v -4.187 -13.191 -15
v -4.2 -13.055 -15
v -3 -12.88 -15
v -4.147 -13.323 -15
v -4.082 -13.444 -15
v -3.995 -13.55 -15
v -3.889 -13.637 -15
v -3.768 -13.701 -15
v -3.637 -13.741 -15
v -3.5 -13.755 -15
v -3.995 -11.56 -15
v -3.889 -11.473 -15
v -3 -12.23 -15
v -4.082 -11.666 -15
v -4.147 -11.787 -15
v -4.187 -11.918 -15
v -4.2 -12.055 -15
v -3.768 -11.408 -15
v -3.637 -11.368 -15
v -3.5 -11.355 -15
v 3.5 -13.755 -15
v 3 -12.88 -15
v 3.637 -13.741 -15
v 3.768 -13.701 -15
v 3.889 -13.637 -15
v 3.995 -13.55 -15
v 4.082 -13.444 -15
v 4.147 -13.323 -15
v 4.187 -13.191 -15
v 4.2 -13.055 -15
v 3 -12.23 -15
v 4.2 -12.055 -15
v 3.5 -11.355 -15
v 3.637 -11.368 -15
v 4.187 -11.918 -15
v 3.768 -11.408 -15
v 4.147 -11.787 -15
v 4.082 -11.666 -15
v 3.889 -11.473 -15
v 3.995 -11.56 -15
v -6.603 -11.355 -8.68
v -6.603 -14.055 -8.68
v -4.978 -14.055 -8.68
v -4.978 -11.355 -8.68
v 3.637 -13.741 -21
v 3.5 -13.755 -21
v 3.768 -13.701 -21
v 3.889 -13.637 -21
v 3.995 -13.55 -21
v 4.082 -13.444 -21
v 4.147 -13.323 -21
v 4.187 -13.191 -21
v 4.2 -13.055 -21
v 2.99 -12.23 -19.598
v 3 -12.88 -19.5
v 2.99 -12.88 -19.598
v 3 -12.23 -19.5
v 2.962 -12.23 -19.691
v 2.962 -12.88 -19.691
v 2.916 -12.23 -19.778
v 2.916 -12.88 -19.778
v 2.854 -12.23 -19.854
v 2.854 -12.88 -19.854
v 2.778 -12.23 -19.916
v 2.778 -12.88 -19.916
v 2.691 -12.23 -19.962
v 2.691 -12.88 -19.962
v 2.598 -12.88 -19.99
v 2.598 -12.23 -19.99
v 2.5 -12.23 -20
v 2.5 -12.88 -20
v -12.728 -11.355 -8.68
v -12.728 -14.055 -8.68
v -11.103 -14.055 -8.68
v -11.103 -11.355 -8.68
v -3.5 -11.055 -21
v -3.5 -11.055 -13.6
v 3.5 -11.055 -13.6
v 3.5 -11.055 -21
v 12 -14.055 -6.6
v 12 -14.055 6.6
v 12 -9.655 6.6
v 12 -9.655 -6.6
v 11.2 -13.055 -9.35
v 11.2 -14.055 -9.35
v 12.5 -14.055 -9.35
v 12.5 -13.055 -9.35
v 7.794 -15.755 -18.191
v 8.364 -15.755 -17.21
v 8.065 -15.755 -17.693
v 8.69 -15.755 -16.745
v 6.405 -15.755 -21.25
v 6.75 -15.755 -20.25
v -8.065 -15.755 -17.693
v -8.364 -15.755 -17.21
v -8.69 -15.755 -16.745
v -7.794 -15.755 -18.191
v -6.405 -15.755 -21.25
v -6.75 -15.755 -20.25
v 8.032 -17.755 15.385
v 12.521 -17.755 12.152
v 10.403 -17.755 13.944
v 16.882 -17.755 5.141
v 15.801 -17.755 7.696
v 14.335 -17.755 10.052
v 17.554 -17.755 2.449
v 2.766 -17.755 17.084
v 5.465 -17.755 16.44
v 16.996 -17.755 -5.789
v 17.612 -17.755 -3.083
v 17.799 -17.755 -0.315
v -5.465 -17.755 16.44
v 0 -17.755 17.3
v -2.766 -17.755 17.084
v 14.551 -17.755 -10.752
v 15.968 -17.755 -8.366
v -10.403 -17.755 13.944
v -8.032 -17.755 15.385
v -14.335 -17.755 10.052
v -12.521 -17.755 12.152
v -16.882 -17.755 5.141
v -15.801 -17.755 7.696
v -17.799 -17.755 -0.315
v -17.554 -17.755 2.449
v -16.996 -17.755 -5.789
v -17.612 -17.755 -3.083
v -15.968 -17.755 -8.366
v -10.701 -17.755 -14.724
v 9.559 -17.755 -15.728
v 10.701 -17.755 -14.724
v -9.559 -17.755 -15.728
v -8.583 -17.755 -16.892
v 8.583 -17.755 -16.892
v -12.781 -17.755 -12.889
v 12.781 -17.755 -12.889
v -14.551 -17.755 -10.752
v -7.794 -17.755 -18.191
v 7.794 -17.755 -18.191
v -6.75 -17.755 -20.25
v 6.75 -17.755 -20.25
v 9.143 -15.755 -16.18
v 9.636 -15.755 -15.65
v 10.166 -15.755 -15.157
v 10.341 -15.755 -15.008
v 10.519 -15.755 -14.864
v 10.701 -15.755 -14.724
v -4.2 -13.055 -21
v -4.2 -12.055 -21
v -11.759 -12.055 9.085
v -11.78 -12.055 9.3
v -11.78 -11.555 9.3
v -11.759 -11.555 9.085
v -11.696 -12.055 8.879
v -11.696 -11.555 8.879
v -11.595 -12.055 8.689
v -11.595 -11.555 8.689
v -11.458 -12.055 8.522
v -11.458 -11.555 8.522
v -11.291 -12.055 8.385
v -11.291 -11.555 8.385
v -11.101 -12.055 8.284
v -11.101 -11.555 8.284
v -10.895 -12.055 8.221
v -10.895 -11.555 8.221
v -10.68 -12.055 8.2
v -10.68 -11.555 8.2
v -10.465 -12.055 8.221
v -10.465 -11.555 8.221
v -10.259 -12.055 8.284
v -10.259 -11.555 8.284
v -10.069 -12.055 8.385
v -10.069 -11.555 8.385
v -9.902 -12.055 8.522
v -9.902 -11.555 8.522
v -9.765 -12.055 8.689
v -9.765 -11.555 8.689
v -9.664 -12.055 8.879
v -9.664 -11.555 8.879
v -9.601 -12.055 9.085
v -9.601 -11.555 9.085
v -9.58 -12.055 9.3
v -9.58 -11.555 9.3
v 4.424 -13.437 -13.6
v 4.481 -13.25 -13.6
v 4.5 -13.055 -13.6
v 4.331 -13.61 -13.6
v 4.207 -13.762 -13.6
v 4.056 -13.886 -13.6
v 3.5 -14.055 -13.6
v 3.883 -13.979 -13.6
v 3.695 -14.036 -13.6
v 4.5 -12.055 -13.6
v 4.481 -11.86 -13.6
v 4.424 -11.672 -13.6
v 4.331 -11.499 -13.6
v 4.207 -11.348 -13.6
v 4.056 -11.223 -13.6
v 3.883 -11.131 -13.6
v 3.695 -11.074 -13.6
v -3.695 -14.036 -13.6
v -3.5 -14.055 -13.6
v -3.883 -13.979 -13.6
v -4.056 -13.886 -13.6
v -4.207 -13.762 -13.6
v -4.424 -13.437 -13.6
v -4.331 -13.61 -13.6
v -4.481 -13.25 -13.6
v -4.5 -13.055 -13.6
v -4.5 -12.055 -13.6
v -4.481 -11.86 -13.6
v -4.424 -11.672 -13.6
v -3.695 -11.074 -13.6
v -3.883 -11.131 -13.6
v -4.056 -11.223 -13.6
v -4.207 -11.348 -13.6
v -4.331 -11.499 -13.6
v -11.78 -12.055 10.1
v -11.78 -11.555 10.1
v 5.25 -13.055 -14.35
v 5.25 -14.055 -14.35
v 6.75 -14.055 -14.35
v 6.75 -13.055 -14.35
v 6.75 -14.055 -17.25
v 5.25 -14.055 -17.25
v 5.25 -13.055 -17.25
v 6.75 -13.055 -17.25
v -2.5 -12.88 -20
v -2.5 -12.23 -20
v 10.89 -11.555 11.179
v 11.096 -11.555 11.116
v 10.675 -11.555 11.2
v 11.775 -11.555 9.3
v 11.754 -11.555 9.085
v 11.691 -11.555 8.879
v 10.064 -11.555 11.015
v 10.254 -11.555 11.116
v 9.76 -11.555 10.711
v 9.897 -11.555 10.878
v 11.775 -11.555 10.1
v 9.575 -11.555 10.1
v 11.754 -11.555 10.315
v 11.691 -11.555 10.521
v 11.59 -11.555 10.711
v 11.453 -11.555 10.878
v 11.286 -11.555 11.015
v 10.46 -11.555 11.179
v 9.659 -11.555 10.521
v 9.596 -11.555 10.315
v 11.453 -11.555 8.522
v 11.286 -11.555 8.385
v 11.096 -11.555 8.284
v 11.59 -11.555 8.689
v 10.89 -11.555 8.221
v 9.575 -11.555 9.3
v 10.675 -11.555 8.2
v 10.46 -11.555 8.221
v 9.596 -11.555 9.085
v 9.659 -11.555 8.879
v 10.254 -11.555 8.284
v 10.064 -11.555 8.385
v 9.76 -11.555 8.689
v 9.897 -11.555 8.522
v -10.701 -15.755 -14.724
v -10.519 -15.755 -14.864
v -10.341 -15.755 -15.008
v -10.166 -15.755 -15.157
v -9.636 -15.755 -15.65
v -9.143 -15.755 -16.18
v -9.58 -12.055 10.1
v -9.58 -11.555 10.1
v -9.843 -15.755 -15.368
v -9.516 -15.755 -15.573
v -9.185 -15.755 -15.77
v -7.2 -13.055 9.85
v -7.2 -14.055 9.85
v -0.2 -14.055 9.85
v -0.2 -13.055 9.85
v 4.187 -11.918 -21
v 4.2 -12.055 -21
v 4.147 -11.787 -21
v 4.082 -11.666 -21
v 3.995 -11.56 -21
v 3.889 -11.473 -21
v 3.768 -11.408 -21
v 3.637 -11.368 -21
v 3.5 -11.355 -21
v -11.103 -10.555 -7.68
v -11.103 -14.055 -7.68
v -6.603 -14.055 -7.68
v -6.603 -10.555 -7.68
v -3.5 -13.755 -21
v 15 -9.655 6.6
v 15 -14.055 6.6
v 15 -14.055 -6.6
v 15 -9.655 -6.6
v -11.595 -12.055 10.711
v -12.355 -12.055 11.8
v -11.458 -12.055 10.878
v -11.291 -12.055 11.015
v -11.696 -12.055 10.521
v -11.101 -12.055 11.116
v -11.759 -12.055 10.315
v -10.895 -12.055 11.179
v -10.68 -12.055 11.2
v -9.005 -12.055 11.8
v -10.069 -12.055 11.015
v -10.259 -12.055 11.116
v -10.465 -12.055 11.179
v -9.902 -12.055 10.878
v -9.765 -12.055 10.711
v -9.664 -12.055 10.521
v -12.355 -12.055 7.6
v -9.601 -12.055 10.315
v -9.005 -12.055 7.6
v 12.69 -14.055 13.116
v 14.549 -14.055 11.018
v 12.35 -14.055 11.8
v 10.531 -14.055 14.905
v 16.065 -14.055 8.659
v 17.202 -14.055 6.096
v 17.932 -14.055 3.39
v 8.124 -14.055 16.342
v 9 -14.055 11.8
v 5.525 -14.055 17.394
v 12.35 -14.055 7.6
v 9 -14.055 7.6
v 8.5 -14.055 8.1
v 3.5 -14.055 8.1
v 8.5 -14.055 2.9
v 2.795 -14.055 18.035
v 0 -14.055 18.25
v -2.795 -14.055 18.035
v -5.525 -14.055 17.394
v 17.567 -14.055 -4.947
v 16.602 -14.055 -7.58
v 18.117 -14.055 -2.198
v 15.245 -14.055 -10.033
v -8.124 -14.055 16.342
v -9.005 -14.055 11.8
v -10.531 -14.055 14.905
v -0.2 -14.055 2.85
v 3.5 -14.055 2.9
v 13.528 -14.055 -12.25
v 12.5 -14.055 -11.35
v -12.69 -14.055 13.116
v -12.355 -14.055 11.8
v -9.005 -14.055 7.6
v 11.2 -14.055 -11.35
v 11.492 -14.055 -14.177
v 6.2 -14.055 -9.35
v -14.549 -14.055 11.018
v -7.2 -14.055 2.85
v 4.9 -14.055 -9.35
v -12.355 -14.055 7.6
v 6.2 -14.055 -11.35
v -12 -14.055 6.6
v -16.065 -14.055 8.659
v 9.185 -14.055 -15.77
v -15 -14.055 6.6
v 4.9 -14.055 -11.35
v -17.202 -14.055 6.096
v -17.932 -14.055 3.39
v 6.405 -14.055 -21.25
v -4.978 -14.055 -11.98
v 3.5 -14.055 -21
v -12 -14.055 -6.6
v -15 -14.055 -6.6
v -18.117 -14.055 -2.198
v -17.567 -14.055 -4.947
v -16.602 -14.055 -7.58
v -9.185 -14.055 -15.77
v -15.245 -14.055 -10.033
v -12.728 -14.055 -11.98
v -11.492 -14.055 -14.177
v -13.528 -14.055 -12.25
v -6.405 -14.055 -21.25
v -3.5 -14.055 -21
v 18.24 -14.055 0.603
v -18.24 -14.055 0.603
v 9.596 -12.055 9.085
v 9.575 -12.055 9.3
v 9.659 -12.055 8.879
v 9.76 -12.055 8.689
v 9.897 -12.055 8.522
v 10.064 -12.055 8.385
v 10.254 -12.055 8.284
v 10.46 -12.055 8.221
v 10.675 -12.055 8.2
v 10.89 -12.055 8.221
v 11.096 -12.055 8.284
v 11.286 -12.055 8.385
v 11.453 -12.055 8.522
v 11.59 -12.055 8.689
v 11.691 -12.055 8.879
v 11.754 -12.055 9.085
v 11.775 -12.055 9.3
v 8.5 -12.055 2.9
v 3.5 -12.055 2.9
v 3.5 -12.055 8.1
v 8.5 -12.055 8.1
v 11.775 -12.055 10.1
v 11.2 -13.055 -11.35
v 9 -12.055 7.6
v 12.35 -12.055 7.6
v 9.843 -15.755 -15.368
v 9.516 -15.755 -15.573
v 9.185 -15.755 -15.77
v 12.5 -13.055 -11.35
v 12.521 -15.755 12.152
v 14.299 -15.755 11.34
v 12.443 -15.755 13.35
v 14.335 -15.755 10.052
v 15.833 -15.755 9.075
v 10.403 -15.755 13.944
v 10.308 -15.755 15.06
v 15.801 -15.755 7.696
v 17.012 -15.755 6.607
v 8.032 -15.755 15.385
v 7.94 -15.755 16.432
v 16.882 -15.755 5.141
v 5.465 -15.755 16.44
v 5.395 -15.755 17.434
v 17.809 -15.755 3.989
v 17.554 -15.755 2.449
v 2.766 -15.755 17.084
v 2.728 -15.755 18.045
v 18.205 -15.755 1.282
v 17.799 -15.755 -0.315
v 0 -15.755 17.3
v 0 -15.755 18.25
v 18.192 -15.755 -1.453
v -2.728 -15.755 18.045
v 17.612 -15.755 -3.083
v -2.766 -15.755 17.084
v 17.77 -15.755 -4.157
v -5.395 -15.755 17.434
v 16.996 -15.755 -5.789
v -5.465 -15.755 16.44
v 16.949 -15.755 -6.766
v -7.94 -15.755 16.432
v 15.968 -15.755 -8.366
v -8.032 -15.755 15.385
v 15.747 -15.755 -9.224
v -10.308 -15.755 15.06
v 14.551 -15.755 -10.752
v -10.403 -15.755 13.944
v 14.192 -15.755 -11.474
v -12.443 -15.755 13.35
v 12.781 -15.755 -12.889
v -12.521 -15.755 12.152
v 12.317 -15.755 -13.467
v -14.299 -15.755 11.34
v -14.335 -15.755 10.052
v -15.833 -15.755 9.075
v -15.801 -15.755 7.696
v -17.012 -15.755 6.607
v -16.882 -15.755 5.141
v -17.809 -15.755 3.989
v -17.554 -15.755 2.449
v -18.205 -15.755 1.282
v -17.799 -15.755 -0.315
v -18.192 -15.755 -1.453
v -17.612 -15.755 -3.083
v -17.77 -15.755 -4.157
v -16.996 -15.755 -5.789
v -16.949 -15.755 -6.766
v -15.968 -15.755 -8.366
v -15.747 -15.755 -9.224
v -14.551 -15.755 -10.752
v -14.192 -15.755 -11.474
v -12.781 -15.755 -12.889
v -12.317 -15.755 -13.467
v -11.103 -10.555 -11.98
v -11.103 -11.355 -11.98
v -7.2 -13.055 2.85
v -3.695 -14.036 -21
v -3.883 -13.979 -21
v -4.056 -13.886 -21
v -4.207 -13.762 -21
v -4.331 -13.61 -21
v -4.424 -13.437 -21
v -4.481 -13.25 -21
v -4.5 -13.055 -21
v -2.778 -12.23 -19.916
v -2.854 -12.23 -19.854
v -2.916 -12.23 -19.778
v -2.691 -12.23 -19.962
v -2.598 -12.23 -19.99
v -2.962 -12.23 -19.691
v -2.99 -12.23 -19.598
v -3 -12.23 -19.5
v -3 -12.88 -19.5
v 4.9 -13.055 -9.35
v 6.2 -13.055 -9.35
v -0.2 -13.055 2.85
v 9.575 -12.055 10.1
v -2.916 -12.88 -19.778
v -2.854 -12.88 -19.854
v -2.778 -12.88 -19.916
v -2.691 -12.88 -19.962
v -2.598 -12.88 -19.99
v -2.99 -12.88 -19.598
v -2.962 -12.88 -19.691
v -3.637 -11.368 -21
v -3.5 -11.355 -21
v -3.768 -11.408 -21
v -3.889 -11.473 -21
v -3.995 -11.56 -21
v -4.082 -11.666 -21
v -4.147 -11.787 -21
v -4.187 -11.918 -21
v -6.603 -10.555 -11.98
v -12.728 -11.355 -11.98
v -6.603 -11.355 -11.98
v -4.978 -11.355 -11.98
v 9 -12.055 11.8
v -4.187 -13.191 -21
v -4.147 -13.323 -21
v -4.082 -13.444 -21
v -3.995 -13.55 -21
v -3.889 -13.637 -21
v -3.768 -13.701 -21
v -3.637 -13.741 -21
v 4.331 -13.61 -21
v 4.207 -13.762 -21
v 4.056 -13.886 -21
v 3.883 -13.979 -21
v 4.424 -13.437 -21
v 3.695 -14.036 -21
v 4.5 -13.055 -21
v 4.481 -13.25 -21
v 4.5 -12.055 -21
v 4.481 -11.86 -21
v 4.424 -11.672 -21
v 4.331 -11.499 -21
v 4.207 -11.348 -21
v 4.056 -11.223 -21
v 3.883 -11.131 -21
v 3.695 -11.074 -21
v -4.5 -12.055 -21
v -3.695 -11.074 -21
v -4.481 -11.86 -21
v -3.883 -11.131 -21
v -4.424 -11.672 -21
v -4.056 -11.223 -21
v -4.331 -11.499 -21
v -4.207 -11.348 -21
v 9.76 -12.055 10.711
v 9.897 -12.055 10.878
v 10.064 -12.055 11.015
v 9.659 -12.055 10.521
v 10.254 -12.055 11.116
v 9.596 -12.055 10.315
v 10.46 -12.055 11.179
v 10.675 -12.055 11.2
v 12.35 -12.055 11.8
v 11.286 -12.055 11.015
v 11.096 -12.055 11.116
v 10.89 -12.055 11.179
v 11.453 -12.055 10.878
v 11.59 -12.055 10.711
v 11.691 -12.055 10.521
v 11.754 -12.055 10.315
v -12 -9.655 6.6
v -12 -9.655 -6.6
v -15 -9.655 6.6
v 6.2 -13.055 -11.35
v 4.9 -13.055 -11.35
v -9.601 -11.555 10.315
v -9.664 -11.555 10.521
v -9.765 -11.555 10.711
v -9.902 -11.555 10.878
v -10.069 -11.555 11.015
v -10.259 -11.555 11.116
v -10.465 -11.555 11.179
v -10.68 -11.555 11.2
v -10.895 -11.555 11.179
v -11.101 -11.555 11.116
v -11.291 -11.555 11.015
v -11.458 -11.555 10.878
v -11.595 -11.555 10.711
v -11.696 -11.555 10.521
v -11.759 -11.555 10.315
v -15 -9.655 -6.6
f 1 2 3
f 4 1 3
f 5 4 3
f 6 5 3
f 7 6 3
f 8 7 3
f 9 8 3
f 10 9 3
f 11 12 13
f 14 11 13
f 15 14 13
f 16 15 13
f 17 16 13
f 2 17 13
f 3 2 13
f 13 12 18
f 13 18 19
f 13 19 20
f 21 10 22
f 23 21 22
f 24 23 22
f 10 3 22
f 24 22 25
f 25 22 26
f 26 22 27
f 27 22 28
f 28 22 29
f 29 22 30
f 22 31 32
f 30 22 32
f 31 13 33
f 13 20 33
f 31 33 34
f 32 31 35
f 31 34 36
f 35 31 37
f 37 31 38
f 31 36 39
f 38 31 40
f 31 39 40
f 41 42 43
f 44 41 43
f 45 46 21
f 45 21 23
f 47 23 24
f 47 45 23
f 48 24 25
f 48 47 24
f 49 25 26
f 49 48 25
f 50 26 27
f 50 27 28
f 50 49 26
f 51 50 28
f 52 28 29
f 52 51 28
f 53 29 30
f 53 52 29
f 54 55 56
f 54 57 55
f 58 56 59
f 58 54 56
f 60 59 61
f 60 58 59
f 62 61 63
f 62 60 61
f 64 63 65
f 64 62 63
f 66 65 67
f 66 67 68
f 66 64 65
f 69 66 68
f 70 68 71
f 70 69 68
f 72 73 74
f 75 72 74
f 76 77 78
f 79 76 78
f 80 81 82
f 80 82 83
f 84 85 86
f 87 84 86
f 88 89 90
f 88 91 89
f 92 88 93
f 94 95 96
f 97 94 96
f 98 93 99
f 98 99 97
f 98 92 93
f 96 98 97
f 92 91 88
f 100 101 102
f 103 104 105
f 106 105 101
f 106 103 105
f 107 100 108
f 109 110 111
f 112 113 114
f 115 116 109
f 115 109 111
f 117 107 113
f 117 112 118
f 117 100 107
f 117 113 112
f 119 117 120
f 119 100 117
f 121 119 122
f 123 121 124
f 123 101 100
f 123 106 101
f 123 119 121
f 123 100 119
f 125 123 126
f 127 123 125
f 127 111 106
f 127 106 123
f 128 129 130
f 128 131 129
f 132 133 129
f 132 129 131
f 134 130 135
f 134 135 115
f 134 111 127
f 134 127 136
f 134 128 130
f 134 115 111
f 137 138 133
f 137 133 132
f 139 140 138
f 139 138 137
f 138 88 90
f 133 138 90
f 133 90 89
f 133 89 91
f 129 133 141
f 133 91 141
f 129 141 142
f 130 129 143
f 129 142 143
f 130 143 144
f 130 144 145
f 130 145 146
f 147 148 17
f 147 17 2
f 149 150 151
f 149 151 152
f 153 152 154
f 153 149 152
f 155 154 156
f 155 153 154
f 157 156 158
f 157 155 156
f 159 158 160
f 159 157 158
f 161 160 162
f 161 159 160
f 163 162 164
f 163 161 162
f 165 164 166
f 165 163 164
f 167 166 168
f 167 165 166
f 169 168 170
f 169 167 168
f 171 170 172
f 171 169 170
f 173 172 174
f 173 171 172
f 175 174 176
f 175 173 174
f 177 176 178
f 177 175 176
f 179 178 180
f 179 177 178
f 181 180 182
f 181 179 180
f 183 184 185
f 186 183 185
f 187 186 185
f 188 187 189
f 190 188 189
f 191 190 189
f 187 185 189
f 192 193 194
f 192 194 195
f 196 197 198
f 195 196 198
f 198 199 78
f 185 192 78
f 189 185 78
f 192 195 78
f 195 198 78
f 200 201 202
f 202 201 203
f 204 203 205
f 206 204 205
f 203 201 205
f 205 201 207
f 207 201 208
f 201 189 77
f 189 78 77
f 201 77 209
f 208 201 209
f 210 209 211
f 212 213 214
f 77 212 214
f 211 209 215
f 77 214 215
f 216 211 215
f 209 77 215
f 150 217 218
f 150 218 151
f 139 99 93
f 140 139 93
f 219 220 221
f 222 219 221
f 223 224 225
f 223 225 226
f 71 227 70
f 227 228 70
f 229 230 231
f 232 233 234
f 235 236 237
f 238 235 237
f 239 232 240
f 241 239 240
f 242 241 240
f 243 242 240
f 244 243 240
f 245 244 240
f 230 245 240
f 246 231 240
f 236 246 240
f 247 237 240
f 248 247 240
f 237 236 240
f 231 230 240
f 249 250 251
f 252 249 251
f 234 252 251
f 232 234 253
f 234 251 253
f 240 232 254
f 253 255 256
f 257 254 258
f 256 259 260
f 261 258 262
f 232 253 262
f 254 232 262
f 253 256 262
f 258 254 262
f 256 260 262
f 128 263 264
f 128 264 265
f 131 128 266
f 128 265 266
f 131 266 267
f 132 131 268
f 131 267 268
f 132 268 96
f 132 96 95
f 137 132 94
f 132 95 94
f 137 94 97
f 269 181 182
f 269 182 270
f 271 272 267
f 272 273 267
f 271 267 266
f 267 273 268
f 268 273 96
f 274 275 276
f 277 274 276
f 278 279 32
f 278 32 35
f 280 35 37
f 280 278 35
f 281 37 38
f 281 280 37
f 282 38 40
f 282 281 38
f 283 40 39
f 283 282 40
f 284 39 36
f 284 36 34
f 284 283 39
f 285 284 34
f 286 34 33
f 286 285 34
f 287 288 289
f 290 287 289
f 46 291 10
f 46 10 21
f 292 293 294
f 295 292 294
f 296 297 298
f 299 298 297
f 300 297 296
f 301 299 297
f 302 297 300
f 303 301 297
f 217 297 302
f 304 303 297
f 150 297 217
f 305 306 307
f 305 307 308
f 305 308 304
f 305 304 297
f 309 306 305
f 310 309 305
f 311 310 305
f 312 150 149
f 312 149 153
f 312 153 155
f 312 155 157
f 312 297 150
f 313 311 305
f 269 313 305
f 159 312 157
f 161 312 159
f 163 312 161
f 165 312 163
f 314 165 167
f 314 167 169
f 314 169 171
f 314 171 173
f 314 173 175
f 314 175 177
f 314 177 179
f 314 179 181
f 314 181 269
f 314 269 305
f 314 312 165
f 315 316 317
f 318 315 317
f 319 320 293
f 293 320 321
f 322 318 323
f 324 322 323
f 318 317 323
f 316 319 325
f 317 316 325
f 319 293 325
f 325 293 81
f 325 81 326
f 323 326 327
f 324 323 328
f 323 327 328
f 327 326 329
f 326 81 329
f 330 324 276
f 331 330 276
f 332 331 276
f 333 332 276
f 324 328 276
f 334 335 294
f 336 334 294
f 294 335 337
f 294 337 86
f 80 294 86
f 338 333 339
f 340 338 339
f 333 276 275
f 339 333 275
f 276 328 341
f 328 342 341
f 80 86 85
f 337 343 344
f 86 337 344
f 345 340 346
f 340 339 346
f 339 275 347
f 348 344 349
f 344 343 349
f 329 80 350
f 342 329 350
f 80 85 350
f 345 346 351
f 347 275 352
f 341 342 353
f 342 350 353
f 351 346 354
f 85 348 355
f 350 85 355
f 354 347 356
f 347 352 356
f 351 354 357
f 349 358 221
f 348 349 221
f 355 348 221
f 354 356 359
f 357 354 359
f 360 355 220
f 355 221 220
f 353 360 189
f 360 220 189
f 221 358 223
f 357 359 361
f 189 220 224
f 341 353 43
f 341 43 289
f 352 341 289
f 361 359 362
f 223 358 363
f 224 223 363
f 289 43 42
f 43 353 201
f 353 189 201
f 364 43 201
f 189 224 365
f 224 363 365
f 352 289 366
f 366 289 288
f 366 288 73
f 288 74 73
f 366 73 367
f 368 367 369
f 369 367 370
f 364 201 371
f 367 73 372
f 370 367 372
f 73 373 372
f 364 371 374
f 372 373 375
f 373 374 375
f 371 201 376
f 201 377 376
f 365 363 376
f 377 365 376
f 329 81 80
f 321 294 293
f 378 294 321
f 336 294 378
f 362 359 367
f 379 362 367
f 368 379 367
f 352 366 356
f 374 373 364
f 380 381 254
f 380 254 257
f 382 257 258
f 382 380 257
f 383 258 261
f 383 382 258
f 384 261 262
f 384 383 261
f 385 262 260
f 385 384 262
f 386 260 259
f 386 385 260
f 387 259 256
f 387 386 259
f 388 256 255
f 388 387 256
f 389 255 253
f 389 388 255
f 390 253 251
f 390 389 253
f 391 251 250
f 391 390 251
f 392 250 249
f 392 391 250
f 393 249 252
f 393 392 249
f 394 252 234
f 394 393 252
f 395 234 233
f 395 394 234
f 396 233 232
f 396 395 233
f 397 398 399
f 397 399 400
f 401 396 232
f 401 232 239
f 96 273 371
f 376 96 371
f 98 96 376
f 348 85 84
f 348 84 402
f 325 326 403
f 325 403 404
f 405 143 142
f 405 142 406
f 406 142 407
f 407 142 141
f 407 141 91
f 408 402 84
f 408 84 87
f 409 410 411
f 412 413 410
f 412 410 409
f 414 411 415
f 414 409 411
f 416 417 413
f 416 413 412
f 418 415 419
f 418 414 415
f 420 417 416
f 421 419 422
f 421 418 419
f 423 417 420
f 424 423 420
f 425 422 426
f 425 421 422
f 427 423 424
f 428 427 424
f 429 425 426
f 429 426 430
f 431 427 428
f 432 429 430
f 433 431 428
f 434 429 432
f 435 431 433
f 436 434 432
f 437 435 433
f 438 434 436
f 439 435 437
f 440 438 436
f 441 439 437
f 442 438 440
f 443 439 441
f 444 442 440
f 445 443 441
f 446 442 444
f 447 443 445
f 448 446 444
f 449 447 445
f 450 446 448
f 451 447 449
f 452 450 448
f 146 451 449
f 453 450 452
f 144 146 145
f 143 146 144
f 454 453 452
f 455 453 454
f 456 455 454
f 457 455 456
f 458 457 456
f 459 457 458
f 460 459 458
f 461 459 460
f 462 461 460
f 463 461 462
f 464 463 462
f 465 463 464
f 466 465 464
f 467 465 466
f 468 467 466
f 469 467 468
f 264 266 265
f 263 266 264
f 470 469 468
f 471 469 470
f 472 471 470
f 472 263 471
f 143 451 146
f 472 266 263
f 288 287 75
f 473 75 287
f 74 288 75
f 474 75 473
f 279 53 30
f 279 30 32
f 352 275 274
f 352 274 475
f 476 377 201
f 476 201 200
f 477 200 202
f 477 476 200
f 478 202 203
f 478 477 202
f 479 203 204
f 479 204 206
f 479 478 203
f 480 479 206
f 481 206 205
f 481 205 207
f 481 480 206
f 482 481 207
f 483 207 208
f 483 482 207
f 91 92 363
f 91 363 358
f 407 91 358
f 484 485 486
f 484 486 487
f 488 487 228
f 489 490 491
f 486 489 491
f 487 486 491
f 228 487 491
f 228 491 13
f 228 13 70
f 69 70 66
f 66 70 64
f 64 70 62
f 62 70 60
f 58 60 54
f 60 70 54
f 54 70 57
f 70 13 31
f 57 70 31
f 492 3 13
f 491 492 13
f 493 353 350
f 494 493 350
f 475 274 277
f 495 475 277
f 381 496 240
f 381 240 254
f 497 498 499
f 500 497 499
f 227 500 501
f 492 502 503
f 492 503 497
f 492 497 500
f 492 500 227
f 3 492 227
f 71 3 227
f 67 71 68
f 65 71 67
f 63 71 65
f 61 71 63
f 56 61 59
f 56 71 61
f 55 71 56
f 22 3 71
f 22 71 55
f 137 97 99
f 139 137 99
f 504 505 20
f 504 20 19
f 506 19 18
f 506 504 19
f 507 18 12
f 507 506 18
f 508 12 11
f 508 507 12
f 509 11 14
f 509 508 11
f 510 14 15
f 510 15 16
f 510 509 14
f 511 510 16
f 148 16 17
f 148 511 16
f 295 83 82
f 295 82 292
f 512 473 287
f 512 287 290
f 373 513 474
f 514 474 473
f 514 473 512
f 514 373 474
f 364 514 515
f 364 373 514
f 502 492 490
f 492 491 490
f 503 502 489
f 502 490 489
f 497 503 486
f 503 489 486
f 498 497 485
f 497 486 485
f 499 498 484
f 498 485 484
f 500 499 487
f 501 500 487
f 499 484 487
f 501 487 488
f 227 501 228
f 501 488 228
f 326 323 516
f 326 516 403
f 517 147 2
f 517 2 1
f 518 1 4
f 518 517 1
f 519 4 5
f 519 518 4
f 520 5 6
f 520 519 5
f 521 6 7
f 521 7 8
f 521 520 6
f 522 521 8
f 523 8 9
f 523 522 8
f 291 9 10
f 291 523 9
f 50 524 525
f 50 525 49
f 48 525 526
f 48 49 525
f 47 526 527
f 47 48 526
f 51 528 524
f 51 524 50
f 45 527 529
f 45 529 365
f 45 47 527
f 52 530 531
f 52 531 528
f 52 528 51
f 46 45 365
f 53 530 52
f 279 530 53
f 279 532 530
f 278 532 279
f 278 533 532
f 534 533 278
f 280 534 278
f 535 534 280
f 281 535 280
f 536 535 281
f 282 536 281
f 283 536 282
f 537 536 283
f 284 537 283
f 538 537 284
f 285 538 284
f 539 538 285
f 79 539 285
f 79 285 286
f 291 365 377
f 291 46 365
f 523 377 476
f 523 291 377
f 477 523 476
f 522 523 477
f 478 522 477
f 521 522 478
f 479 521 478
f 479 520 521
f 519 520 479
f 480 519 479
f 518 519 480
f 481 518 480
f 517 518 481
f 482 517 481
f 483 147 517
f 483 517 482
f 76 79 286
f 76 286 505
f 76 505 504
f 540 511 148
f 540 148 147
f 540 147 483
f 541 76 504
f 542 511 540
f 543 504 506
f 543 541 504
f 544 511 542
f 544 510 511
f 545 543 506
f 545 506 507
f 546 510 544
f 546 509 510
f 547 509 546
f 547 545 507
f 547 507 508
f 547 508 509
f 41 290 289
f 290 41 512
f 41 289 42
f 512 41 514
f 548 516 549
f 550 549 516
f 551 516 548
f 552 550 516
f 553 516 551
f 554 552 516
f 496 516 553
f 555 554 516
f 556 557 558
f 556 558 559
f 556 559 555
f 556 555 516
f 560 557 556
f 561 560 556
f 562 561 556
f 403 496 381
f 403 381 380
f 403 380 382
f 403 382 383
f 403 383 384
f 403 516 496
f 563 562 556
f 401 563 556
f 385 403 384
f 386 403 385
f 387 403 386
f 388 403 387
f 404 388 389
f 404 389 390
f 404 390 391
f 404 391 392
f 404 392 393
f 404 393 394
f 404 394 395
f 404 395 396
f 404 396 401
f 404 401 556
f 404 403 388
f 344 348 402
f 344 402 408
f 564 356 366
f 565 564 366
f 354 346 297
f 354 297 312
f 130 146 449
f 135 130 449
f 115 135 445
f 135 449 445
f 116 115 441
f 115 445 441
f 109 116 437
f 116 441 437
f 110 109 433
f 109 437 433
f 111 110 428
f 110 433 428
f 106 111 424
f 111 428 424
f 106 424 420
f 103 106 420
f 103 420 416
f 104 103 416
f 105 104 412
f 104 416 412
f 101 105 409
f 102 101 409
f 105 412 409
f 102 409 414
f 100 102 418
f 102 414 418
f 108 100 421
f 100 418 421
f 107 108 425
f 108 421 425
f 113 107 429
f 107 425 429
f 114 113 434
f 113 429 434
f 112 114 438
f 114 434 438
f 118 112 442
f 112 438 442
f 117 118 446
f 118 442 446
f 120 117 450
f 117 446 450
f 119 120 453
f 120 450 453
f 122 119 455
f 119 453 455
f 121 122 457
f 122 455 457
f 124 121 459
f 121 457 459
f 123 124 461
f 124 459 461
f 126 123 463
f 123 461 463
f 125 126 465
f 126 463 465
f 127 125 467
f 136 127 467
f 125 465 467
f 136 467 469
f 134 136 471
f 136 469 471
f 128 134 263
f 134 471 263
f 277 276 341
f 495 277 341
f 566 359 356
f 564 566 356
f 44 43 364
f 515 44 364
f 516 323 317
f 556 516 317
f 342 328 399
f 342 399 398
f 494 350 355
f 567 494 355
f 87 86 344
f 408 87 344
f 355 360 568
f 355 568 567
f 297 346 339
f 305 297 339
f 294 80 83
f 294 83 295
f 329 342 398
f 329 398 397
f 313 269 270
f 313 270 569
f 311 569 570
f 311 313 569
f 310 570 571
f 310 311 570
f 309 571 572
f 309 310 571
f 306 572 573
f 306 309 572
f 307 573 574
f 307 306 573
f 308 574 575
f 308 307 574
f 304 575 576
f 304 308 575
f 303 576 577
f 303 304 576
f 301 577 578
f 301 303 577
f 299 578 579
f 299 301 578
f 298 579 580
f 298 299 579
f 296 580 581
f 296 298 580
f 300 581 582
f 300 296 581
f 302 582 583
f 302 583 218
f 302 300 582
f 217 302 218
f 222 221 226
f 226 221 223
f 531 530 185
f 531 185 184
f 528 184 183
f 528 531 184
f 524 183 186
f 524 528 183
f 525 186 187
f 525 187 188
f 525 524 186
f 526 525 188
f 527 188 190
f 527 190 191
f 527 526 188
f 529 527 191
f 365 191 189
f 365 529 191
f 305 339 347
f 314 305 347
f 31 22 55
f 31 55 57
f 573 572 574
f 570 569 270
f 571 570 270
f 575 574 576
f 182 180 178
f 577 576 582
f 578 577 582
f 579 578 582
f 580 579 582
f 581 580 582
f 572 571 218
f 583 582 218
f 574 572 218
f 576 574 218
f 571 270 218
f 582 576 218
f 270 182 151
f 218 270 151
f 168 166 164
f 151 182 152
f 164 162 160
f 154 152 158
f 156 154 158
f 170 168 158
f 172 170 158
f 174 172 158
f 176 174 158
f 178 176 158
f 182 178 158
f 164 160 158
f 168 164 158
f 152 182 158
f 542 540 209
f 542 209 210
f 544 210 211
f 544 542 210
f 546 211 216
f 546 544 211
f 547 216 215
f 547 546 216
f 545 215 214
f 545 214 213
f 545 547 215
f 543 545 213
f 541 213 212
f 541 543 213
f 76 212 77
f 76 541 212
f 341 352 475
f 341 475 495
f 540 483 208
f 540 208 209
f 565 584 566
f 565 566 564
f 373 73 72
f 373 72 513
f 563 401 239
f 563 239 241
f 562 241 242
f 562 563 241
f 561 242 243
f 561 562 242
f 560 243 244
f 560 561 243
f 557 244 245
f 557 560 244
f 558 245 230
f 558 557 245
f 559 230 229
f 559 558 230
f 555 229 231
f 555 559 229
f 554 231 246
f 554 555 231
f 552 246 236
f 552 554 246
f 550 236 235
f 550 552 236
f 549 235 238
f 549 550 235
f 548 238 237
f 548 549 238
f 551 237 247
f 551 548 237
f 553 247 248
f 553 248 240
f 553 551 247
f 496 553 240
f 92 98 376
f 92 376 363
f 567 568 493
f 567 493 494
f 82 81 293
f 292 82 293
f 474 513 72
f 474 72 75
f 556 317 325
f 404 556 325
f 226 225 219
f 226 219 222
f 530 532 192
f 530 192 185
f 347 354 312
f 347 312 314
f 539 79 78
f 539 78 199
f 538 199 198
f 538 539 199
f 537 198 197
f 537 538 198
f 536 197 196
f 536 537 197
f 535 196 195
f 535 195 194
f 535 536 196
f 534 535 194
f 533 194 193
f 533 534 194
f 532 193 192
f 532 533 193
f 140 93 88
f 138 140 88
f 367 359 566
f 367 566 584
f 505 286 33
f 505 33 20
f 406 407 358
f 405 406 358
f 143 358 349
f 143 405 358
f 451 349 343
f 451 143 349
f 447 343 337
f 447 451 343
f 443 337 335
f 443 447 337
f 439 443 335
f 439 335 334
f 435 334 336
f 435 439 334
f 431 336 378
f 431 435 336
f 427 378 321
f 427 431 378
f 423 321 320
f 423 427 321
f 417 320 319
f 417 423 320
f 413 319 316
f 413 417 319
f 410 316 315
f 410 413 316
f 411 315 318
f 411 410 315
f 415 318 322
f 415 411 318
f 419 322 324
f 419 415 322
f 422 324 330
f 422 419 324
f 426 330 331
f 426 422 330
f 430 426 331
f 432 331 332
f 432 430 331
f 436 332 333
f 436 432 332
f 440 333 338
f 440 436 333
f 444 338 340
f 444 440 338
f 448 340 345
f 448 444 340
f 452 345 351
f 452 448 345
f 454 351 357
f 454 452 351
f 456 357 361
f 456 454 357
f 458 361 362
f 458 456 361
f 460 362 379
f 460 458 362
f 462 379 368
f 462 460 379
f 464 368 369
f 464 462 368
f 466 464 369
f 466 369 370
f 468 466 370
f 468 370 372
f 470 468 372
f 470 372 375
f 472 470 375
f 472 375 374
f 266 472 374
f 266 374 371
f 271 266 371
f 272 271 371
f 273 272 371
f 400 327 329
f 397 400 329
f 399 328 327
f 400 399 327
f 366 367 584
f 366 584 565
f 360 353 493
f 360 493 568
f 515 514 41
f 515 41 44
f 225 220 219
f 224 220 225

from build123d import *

# Parameters (mm, degrees)
BOSS_EXTRUDE1_DEPTH  = 1.7
BOSS_EXTRUDE2_DEPTH  = 2
BOSS_EXTRUDE3_START  = 1.7
SKETCH3_W            = 3
SKETCH3_H            = 13.2
BOSS_EXTRUDE3_DEPTH  = 4.4
BOSS_EXTRUDE4_START  = -21
BOSS_EXTRUDE4_DEPTH  = 7.4
CUT_EXTRUDE1_START   = -21
CUT_EXTRUDE1_DEPTH   = 6
BOSS_EXTRUDE5_START  = -15
SKETCH8_W            = 6
SKETCH8_H            = 0.65
BOSS_EXTRUDE5_DEPTH  = 5
FILLET1_R            = 0.5
BOSS_EXTRUDE6_START  = 1.7
SKETCH9_W            = 5
SKETCH9_H            = 5.2
BOSS_EXTRUDE6_DEPTH  = 2
BOSS_EXTRUDE7_START  = 1.7
SKETCH10_W           = 3.35
SKETCH10_H           = 4.2
BOSS_EXTRUDE7_DEPTH  = 2
BOSS_EXTRUDE8_START  = 3.7
BOSS_EXTRUDE8_DEPTH  = 0.5
BOSS_EXTRUDE9_START  = 1.7
SKETCH12_W           = 4.5
SKETCH12_H           = 4.3
BOSS_EXTRUDE9_DEPTH  = 3.5
BOSS_EXTRUDE10_START = 1.7
SKETCH13_W           = 7.75
SKETCH13_H           = 3.3
BOSS_EXTRUDE10_DEPTH = 2.7
BOSS_EXTRUDE11_START = 1.7
SKETCH14_W           = 7
SKETCH14_H           = 7
BOSS_EXTRUDE11_DEPTH = 1
BOSS_EXTRUDE12_START = 1.7
SKETCH15_W           = 1.3
SKETCH15_H           = 2
BOSS_EXTRUDE12_DEPTH = 1
BOSS_EXTRUDE13_START = 1.7
SKETCH16_W           = 1.5
SKETCH16_H           = 2.9
BOSS_EXTRUDE13_DEPTH = 1


with BuildPart() as part:
    # Sketch1 → Boss-Extrude1 (new body)
    with BuildSketch(Plane(origin=(0, 0, 0), x_dir=(1, 0, 0), z_dir=(0, 1, 0))):
        with BuildLine():
            Line((-6.405, 21.250170418), (6.405, 21.250170418))
            Line((6.405, 21.250170418), (9.185, 15.770170418))
            ThreePointArc((9.185, 15.770170418), (0, -18.25), (-9.185, 15.770170418))
            Line((-9.185, 15.770170418), (-6.405, 21.250170418))
        make_face()
    extrude(amount=BOSS_EXTRUDE1_DEPTH)

    # Sketch2 → Boss-Extrude2 (add)
    with BuildSketch(Plane(origin=(0, 0, 0), x_dir=(1, 0, 0), z_dir=(0, 1, 0))):
        with BuildLine():
            Line((-6.75, 20.250170418), (6.75, 20.250170418))
            Line((6.75, 20.250170418), (7.794367451, 18.191489254))
            ThreePointArc((7.794367451, 18.191489254), (9.048926778, 16.291420125), (10.700777057, 14.724393497))
            ThreePointArc((10.700777057, 14.724393497), (0, -17.3), (-10.700777057, 14.724393497))
            ThreePointArc((-10.700777057, 14.724393497), (-9.048926778, 16.291420125), (-7.794367451, 18.191489254))
            Line((-7.794367451, 18.191489254), (-6.75, 20.250170418))
        make_face()
    extrude(amount=-BOSS_EXTRUDE2_DEPTH)

    # Sketch3 → Boss-Extrude3 (add)
    with BuildSketch(Plane(origin=(0, 0, 0), x_dir=(1, 0, 0), z_dir=(0, 1, 0)).offset(BOSS_EXTRUDE3_START)):
        with Locations((-13.5, 0)):
            Rectangle(SKETCH3_W, SKETCH3_H)
        with Locations((13.5, 0)):
            Rectangle(SKETCH3_W, SKETCH3_H)
    extrude(amount=BOSS_EXTRUDE3_DEPTH)

    # Sketch4 → Boss-Extrude4 (add)
    with BuildSketch(Plane.XY.offset(BOSS_EXTRUDE4_START)):
        with BuildLine():
            Line((3.5, 1.7), (-3.5, 1.7))
            ThreePointArc((-3.5, 1.7), (-4.207106781, 1.992893219), (-4.5, 2.7))
            Line((-4.5, 2.7), (-4.5, 3.7))
            ThreePointArc((-4.5, 3.7), (-4.207106781, 4.407106781), (-3.5, 4.7))
            Line((-3.5, 4.7), (3.5, 4.7))
            ThreePointArc((3.5, 4.7), (4.207106781, 4.407106781), (4.5, 3.7))
            Line((4.5, 3.7), (4.5, 2.7))
            ThreePointArc((4.5, 2.7), (4.207106781, 1.992893219), (3.5, 1.7))
        make_face()
    extrude(amount=BOSS_EXTRUDE4_DEPTH)

    # Sketch7 → Cut-Extrude1 (cut)
    with BuildSketch(Plane.XY.offset(CUT_EXTRUDE1_START)):
        with BuildLine():
            Line((4.2, 2.7), (4.2, 3.7))
            ThreePointArc((4.2, 3.7), (3.994974747, 4.194974747), (3.5, 4.4))
            Line((3.5, 4.4), (-3.5, 4.4))
            ThreePointArc((-3.5, 4.4), (-3.994974747, 4.194974747), (-4.2, 3.7))
            Line((-4.2, 3.7), (-4.2, 2.7))
            ThreePointArc((-4.2, 2.7), (-3.994974747, 2.205025253), (-3.5, 2))
            Line((-3.5, 2), (3.5, 2))
            ThreePointArc((3.5, 2), (3.994974747, 2.205025253), (4.2, 2.7))
        make_face()
    extrude(amount=CUT_EXTRUDE1_DEPTH, mode=Mode.SUBTRACT)

    # Sketch8 → Boss-Extrude5 (add)
    with BuildSketch(Plane.XY.offset(BOSS_EXTRUDE5_START)):
        with Locations((0, 3.2)):
            Rectangle(SKETCH8_W, SKETCH8_H)
    extrude(amount=-BOSS_EXTRUDE5_DEPTH)

    # Fillet1
    fillet1_edges = [part.edges().sort_by_distance(p)[0] for p in [
        (-3, 3.2, -20),
        (3, 3.2, -20),
    ]]
    fillet(fillet1_edges, radius=FILLET1_R)

    # Sketch9 → Boss-Extrude6 (add)
    with BuildSketch(Plane(origin=(0, 0, 0), x_dir=(1, 0, 0), z_dir=(0, 1, 0)).offset(BOSS_EXTRUDE6_START)):
        with Locations((6, -5.5)):
            Rectangle(SKETCH9_W, SKETCH9_H)
    extrude(amount=BOSS_EXTRUDE6_DEPTH)

    # Sketch10 → Boss-Extrude7 (add)
    with BuildSketch(Plane(origin=(0, 0, 0), x_dir=(1, 0, 0), z_dir=(0, 1, 0)).offset(BOSS_EXTRUDE7_START)):
        with Locations((10.675, -9.7)):
            Rectangle(SKETCH10_W, SKETCH10_H)
        with Locations((-10.68, -9.7)):
            Rectangle(SKETCH10_W, SKETCH10_H)
    extrude(amount=BOSS_EXTRUDE7_DEPTH)

    # Sketch11 → Boss-Extrude8 (add)
    with BuildSketch(Plane(origin=(0, 0, 0), x_dir=(1, 0, 0), z_dir=(0, 1, 0)).offset(BOSS_EXTRUDE8_START)):
        with BuildLine():
            Line((-11.78, -10.1), (-11.78, -9.3))
            ThreePointArc((-11.78, -9.3), (-10.68, -8.2), (-9.58, -9.3))
            Line((-9.58, -9.3), (-9.58, -10.1))
            ThreePointArc((-9.58, -10.1), (-10.68, -11.2), (-11.78, -10.1))
        make_face()
        with BuildLine():
            Line((9.575, -10.1), (9.575, -9.3))
            ThreePointArc((9.575, -9.3), (10.675, -8.2), (11.775, -9.3))
            Line((11.775, -9.3), (11.775, -10.1))
            ThreePointArc((11.775, -10.1), (10.675, -11.2), (9.575, -10.1))
        make_face()
    extrude(amount=BOSS_EXTRUDE8_DEPTH)

    # Sketch12 → Boss-Extrude9 (add)
    with BuildSketch(Plane(origin=(0, 0, 0), x_dir=(1, 0, 0), z_dir=(0, 1, 0)).offset(BOSS_EXTRUDE9_START)):
        with Locations((-8.852751595, 9.830469474)):
            Rectangle(SKETCH12_W, SKETCH12_H)
    extrude(amount=BOSS_EXTRUDE9_DEPTH)

    # Sketch13 → Boss-Extrude10 (add)
    with BuildSketch(Plane(origin=(0, 0, 0), x_dir=(1, 0, 0), z_dir=(0, 1, 0)).offset(BOSS_EXTRUDE10_START)):
        with Locations((-8.852751595, 10.330469474)):
            Rectangle(SKETCH13_W, SKETCH13_H)
    extrude(amount=BOSS_EXTRUDE10_DEPTH)

    # Sketch14 → Boss-Extrude11 (add)
    with BuildSketch(Plane(origin=(0, 0, 0), x_dir=(1, 0, 0), z_dir=(0, 1, 0)).offset(BOSS_EXTRUDE11_START)):
        with Locations((-3.7, -6.35)):
            Rectangle(SKETCH14_W, SKETCH14_H)
    extrude(amount=BOSS_EXTRUDE11_DEPTH)

    # Sketch15 → Boss-Extrude12 (add)
    with BuildSketch(Plane(origin=(0, 0, 0), x_dir=(1, 0, 0), z_dir=(0, 1, 0)).offset(BOSS_EXTRUDE12_START)):
        with Locations((11.85, 10.35)):
            Rectangle(SKETCH15_W, SKETCH15_H)
        with Locations((5.55, 10.35)):
            Rectangle(SKETCH15_W, SKETCH15_H)
    extrude(amount=BOSS_EXTRUDE12_DEPTH)

    # Sketch16 → Boss-Extrude13 (add)
    with BuildSketch(Plane(origin=(0, 0, 0), x_dir=(1, 0, 0), z_dir=(0, 1, 0)).offset(BOSS_EXTRUDE13_START)):
        with Locations((6, 15.8)):
            Rectangle(SKETCH16_W, SKETCH16_H)
    extrude(amount=BOSS_EXTRUDE13_DEPTH)


with BuildPart() as part_1:
    # Body-Move/Copy2: moved
    add(part.part.moved(Location((0, -15.754739533, 0))))


solid = part_1.part
